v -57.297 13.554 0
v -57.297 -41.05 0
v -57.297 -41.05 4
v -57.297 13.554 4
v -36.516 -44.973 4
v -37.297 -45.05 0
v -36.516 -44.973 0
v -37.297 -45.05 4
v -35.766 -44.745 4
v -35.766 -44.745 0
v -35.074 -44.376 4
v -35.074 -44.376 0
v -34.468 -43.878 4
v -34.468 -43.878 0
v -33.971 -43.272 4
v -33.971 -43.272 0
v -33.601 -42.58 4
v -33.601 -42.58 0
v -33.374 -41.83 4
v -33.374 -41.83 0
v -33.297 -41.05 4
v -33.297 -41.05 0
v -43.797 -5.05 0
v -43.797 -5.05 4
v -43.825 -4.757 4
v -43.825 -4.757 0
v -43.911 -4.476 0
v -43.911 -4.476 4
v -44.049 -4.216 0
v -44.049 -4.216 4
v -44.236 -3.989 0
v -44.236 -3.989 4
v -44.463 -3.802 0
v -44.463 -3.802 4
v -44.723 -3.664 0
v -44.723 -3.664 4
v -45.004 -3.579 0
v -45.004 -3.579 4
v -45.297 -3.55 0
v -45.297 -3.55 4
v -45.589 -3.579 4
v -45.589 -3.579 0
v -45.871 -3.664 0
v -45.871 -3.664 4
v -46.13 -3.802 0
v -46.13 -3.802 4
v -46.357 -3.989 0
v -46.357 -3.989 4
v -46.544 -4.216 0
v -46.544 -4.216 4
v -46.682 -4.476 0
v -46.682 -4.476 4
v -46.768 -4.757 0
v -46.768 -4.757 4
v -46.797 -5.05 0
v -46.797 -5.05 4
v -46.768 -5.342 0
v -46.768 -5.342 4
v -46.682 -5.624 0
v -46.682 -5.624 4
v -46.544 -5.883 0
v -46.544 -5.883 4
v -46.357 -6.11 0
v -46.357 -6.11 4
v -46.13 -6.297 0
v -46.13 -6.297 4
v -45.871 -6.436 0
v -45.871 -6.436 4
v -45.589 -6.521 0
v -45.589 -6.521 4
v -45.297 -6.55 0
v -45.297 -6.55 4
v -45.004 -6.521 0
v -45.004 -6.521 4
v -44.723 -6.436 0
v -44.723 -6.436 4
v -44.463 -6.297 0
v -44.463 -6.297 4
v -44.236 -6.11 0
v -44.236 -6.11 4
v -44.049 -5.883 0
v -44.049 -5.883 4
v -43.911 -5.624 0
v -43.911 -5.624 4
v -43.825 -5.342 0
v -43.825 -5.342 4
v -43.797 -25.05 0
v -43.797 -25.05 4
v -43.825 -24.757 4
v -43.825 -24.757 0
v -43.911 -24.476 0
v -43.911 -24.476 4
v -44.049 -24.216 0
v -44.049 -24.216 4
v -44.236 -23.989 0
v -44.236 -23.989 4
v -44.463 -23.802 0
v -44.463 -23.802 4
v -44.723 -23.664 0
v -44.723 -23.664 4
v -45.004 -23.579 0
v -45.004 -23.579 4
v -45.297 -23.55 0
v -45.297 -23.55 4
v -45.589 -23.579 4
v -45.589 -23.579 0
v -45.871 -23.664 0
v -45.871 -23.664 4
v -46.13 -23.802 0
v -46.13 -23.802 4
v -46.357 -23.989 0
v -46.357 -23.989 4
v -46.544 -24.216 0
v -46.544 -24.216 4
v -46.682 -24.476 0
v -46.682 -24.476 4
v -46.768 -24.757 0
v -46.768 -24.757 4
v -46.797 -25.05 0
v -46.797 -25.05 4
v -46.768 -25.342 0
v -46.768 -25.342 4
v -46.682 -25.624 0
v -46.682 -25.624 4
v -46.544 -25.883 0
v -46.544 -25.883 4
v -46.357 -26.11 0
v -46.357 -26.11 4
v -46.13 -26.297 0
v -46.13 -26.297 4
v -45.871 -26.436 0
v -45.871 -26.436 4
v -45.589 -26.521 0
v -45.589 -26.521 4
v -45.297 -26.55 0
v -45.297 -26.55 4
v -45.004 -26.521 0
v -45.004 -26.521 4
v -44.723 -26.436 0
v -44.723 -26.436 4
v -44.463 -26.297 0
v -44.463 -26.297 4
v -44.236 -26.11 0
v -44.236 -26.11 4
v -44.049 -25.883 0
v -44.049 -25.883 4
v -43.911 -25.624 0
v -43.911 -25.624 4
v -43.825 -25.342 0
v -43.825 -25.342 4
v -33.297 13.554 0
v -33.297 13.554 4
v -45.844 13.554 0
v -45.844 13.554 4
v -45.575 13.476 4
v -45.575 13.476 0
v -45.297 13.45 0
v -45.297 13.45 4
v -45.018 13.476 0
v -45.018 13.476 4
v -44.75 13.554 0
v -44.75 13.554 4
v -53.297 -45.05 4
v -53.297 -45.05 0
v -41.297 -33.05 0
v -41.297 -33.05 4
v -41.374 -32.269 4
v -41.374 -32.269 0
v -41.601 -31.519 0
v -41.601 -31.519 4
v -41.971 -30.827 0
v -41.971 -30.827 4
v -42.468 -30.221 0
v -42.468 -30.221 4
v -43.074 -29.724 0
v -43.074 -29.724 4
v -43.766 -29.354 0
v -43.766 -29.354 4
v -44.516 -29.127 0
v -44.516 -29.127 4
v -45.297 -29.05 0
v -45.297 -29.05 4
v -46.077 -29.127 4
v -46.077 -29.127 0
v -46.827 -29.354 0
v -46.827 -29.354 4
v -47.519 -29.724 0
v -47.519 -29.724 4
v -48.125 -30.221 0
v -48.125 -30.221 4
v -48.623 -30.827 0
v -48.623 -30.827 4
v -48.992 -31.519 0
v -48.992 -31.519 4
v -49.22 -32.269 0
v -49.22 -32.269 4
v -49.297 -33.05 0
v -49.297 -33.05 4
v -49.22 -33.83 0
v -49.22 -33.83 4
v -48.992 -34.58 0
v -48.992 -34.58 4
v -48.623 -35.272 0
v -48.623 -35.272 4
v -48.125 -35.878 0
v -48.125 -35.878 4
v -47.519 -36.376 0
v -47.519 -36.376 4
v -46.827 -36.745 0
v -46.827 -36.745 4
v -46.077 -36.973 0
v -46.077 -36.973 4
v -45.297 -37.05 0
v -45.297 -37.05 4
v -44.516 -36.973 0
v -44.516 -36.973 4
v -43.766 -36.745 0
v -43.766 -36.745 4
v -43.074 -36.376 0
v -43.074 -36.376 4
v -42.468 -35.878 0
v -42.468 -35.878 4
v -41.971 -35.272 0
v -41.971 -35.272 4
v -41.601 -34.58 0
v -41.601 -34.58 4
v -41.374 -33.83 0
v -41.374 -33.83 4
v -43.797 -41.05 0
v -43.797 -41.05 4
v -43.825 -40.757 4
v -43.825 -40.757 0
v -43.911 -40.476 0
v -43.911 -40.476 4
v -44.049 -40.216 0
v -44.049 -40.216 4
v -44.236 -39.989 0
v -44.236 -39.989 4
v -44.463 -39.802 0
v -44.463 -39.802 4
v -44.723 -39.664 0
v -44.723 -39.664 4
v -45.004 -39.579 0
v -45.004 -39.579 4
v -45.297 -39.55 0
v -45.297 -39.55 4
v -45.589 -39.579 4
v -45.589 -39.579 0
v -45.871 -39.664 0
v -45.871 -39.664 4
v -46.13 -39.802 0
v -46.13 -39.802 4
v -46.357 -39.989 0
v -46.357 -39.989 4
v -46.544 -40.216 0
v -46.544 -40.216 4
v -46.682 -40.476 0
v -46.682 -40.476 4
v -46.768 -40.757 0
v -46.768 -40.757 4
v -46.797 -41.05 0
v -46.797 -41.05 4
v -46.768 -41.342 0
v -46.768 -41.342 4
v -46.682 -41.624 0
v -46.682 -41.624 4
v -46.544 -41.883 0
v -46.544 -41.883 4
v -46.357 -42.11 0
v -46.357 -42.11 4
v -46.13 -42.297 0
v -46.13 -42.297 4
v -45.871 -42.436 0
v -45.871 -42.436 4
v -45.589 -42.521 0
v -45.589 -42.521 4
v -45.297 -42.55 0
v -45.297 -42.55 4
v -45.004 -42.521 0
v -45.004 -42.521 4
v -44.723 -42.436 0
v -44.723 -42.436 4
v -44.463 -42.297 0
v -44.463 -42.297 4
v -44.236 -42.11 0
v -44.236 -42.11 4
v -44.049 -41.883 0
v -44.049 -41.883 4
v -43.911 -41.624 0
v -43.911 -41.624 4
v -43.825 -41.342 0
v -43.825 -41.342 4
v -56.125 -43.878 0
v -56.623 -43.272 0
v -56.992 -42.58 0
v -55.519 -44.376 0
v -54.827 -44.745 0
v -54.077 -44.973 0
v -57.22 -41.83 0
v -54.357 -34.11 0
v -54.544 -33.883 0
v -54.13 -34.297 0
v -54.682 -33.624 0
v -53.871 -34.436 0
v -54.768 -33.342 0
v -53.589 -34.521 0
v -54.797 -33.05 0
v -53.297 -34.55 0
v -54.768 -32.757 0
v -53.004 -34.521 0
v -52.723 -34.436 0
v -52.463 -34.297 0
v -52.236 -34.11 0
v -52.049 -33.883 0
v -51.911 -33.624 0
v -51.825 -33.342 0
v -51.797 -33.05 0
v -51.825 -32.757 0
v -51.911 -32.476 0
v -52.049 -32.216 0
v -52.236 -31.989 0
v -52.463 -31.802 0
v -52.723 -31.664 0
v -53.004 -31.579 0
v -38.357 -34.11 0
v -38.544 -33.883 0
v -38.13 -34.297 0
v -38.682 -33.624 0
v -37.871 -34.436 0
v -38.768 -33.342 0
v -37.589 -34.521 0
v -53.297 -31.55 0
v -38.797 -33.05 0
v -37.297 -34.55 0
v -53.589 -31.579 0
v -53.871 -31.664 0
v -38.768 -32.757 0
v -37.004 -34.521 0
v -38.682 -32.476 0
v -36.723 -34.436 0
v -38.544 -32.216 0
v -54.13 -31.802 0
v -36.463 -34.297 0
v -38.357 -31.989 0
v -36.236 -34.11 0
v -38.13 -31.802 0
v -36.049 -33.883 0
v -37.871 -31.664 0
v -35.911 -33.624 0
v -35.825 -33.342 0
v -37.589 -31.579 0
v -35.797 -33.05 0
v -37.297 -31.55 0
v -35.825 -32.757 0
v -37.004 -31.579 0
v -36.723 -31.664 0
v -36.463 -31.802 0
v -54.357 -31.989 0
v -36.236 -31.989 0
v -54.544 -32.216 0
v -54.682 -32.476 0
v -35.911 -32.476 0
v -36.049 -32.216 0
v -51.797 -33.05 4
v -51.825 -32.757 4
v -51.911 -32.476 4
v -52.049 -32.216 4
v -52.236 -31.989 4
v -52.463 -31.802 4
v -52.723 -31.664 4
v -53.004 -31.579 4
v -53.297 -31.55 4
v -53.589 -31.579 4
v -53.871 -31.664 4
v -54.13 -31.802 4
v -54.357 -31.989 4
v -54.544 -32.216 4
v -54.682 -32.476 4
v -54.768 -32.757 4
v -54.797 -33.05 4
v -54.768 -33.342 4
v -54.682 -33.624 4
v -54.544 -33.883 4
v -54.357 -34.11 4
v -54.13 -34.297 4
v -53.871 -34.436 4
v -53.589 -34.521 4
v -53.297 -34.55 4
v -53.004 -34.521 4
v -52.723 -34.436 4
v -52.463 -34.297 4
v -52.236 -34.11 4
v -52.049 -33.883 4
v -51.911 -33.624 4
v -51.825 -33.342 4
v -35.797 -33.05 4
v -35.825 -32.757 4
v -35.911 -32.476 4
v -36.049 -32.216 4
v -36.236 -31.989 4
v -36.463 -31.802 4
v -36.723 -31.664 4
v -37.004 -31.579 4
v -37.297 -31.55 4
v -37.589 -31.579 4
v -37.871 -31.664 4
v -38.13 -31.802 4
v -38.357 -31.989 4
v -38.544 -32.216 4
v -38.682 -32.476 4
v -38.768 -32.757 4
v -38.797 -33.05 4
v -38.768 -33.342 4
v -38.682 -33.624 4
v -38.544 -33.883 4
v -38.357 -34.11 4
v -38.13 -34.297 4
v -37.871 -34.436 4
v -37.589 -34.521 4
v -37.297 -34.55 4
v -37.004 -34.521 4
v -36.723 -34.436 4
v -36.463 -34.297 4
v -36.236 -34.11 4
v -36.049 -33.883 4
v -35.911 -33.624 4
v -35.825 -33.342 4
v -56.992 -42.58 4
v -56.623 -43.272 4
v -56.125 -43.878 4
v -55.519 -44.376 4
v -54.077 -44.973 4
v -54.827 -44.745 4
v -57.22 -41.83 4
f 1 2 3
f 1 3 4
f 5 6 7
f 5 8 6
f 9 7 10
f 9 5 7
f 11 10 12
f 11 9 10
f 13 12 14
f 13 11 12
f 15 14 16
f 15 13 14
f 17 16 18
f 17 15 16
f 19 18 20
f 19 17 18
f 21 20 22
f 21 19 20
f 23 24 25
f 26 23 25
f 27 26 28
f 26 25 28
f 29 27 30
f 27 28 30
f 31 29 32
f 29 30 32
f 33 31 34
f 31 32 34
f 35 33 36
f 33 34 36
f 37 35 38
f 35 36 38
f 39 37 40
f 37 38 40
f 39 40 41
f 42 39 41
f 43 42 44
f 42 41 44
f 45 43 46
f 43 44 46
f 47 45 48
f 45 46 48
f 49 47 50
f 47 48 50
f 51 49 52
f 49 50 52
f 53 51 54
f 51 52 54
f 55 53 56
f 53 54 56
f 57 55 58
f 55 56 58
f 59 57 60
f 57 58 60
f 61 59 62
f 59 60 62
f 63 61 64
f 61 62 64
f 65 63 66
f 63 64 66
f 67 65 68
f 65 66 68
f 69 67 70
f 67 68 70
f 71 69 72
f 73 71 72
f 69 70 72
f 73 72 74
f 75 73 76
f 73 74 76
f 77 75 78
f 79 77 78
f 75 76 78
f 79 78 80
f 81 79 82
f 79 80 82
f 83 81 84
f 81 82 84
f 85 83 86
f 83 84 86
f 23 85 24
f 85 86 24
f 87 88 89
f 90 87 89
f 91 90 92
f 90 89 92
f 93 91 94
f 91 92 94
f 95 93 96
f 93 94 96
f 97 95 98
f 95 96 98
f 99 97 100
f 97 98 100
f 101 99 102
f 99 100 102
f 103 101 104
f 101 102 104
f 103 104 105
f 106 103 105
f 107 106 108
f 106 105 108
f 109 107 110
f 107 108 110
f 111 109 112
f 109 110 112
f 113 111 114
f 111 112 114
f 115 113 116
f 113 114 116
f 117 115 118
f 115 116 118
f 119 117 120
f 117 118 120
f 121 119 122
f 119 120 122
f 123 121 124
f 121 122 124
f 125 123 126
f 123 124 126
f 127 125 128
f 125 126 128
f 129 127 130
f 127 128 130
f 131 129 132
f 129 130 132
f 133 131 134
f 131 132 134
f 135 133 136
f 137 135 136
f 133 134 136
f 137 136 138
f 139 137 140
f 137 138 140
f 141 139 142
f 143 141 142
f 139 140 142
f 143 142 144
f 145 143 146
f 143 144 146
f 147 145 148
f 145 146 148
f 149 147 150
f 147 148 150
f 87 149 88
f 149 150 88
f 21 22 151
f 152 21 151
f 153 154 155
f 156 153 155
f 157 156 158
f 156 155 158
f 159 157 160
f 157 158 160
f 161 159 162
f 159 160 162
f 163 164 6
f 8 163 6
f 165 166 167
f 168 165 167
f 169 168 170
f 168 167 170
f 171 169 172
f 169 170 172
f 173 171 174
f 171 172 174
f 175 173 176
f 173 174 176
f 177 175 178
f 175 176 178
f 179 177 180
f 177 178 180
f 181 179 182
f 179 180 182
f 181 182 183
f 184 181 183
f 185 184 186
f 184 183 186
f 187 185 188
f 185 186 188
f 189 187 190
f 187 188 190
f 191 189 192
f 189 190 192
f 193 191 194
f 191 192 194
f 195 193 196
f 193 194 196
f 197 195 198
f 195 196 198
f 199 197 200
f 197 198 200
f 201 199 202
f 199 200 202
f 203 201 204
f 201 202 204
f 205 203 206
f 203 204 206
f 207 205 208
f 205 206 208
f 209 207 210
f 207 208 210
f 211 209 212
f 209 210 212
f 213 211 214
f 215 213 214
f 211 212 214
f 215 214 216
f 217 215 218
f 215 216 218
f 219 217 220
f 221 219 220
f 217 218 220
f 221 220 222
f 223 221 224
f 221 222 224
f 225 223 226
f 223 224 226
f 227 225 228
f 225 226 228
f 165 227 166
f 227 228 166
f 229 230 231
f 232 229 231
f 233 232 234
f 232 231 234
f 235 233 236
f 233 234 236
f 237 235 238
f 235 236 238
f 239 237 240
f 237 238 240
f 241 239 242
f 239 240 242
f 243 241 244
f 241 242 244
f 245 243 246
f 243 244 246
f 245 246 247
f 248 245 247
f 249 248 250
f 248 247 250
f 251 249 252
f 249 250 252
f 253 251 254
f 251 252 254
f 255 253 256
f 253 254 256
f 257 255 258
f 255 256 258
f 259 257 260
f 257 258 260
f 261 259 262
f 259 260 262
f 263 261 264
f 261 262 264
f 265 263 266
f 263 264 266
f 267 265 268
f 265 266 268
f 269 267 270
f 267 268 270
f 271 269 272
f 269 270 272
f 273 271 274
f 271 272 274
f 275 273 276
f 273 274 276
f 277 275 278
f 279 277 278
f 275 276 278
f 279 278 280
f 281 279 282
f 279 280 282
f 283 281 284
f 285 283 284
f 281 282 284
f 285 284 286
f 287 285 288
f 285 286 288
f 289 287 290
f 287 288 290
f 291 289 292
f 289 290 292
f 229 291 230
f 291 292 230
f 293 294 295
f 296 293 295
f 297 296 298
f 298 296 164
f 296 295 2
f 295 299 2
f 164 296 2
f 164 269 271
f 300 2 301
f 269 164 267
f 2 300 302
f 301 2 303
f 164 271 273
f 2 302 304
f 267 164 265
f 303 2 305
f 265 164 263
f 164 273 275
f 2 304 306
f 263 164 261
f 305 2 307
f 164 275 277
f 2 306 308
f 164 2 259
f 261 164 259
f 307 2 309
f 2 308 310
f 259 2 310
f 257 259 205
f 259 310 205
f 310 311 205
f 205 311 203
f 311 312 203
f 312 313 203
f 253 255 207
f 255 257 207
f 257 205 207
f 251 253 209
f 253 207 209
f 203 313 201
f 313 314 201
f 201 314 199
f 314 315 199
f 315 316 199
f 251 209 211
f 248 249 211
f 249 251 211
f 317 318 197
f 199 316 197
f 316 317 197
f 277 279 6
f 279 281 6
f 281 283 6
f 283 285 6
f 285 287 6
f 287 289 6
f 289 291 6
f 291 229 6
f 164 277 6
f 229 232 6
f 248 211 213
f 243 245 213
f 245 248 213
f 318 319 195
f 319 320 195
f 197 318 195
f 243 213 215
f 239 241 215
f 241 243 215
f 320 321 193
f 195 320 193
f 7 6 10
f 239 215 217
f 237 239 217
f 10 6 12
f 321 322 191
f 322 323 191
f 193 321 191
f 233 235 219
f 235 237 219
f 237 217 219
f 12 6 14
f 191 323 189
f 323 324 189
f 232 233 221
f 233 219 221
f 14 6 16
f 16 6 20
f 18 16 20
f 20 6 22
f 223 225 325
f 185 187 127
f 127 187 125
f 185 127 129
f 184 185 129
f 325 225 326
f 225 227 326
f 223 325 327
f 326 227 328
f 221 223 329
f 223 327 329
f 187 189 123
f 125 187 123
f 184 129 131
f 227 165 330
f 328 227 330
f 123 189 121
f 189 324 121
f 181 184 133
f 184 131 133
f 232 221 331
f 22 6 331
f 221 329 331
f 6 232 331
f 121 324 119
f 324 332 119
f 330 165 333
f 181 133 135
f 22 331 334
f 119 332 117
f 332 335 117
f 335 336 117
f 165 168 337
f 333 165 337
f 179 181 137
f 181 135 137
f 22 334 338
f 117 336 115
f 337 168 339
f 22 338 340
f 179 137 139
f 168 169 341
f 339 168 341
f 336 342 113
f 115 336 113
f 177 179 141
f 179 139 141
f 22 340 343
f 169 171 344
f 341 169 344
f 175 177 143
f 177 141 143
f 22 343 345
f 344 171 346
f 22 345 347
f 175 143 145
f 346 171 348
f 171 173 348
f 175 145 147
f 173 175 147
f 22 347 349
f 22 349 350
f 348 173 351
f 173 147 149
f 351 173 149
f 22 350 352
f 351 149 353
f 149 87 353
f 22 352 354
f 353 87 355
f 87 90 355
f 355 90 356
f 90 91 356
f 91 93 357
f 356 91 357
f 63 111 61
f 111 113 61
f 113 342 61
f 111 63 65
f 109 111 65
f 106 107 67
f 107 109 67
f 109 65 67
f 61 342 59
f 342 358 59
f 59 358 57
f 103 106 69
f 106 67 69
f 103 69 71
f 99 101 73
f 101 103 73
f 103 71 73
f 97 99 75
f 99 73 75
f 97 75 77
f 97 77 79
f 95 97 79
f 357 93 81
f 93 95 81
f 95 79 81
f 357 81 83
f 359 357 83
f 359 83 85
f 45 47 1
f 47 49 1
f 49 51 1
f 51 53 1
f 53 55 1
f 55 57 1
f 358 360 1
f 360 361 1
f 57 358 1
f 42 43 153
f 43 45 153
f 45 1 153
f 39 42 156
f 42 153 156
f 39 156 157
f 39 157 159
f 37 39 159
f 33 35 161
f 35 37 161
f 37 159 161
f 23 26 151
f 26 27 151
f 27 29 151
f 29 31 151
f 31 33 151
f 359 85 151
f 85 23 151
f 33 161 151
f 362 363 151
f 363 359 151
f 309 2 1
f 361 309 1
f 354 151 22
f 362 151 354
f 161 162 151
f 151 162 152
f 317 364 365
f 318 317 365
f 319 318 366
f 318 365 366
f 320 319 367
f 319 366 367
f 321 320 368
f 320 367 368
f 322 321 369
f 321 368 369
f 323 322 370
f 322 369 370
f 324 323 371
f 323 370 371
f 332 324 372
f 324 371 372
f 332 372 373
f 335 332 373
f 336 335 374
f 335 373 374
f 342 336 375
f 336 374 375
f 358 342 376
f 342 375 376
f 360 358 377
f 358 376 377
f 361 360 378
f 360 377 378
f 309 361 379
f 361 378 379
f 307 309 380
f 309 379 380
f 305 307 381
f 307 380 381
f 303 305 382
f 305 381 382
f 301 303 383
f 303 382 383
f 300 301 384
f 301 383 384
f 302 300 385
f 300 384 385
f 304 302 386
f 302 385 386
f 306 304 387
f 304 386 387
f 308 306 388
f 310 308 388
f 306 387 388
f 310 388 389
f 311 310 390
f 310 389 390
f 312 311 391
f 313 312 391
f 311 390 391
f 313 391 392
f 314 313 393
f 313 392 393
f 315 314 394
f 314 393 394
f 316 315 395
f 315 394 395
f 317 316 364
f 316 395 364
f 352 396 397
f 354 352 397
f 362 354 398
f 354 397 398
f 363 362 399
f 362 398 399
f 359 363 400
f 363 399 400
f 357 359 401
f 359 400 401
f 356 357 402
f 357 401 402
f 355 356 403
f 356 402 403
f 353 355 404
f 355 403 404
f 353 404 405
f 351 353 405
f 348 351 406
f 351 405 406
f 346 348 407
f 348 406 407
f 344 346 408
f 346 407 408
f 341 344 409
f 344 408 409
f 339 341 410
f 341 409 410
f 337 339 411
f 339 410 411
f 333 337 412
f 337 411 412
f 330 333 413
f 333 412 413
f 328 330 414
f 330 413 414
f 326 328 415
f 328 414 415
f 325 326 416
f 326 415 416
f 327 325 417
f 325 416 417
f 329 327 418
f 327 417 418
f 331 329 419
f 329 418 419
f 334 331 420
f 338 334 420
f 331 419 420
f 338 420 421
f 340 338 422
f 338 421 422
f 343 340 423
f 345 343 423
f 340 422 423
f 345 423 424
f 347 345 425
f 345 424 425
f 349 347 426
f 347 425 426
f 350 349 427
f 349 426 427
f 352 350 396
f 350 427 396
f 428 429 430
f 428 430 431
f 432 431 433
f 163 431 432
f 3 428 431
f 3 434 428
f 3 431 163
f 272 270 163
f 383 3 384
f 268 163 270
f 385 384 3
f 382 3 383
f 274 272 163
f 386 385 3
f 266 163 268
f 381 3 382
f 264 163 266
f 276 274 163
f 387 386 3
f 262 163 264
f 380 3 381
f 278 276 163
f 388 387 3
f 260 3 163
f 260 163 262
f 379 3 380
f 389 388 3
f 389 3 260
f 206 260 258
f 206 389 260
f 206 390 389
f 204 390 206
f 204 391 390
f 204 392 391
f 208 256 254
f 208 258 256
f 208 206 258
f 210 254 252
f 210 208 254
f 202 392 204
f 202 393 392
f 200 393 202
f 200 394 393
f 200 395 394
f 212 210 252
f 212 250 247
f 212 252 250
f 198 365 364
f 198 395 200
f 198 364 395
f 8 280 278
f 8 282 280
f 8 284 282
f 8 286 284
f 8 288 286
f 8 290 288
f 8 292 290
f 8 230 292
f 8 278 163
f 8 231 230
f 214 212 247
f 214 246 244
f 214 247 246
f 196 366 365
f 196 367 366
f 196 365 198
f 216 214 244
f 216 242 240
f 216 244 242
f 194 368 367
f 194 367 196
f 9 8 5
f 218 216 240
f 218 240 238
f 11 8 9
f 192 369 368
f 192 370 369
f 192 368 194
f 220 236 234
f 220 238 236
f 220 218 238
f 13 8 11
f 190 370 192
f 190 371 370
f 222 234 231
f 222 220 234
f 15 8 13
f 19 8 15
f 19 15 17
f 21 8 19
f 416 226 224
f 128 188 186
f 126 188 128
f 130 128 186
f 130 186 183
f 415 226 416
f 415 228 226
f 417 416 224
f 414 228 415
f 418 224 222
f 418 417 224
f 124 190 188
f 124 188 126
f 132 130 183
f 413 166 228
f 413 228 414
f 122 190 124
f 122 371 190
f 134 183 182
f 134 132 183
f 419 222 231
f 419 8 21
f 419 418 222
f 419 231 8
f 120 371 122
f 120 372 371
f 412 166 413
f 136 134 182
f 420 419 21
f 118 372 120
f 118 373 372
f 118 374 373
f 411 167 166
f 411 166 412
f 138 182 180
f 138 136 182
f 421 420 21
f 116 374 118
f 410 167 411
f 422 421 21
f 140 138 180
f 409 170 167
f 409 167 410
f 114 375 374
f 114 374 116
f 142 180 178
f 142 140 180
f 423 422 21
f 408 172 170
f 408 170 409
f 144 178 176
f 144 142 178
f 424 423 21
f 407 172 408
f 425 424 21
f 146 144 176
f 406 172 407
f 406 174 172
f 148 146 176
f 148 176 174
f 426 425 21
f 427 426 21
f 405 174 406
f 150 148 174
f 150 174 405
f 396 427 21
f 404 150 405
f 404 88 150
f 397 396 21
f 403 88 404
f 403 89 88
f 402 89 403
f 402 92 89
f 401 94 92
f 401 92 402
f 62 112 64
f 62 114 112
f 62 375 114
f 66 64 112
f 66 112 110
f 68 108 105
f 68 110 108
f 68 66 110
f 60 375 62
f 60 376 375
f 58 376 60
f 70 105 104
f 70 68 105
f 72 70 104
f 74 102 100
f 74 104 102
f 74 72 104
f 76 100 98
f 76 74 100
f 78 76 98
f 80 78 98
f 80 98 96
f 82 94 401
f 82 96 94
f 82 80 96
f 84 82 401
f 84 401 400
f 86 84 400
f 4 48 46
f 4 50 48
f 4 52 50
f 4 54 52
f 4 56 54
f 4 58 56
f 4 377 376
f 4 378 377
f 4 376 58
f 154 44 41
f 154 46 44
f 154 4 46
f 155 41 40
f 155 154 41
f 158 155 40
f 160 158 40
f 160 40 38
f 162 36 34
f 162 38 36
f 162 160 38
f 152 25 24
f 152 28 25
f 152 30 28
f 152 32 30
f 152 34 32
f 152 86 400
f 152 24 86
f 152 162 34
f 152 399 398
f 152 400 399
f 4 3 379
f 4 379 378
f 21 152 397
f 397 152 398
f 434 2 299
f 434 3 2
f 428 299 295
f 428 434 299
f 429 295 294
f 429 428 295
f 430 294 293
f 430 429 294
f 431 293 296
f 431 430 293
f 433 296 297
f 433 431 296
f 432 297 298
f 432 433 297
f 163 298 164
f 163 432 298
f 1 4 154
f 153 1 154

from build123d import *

# Parameters (mm, degrees)
SKETCH1_W           = 24
SKETCH1_H           = 80
BOSS_EXTRUDE1_DEPTH = 4
SKETCH2_R           = 4
SKETCH2_R_2         = 1.5
CUT_EXTRUDE1_DEPTH  = 4
FILLET1_R           = 4
SKETCH3_R           = 1.5
CUT_EXTRUDE2_DEPTH  = 4
SKETCH4_W           = 24
SKETCH4_H           = 21.396683756
CUT_EXTRUDE3_DEPTH  = 4


with BuildPart() as part:
    # Sketch1 → Boss-Extrude1 (new body)
    with BuildSketch(Plane.XY):
        with Locations((-45.296675466, -5.049681021)):
            Rectangle(SKETCH1_W, SKETCH1_H)
    extrude(amount=BOSS_EXTRUDE1_DEPTH)

    # Sketch2 → Cut-Extrude1 (cut)
    with BuildSketch(Plane.XY.offset(4)):
        with Locations((-45.296675466, -33.049681021)):
            Circle(SKETCH2_R)
        with Locations((-37.296675466, -33.049681021)):
            Circle(SKETCH2_R_2)
        with Locations((-45.296675466, -41.049681021)):
            Circle(SKETCH2_R_2)
        with Locations((-53.296675466, -33.049681021)):
            Circle(SKETCH2_R_2)
        with Locations((-45.296675466, -25.049681021)):
            Circle(SKETCH2_R_2)
        with Locations((-45.296675466, 30.950318979)):
            Circle(SKETCH2_R_2)
        with Locations((-37.296675466, 22.950318979)):
            Circle(SKETCH2_R_2)
        with Locations((-45.296675466, 14.950318979)):
            Circle(SKETCH2_R_2)
        with Locations((-53.296675466, 22.950318979)):
            Circle(SKETCH2_R_2)
        with Locations((-45.296675466, 22.950318979)):
            Circle(SKETCH2_R)
    extrude(amount=-CUT_EXTRUDE1_DEPTH, mode=Mode.SUBTRACT)

    # Fillet1
    fillet1_edges = [part.edges().sort_by_distance(p)[0] for p in [
        (-57.296675466, 34.950318979, 2),
        (-57.296675466, -45.049681021, 2),
        (-33.296675466, -45.049681021, 2),
        (-33.296675466, 34.950318979, 2),
    ]]
    fillet(fillet1_edges, radius=FILLET1_R)

    # Sketch3 → Cut-Extrude2 (cut)
    with BuildSketch(Plane.XY.offset(4)):
        with Locations((-45.296675466, -5.049681021)):
            Circle(SKETCH3_R)
    extrude(amount=-CUT_EXTRUDE2_DEPTH, mode=Mode.SUBTRACT)

    # Sketch4 → Cut-Extrude3 (cut)
    with BuildSketch(Plane.XY.offset(4)):
        with Locations((-45.296675466, 24.251977101)):
            Rectangle(SKETCH4_W, SKETCH4_H)
    extrude(amount=-CUT_EXTRUDE3_DEPTH, mode=Mode.SUBTRACT)


solid = part.part
